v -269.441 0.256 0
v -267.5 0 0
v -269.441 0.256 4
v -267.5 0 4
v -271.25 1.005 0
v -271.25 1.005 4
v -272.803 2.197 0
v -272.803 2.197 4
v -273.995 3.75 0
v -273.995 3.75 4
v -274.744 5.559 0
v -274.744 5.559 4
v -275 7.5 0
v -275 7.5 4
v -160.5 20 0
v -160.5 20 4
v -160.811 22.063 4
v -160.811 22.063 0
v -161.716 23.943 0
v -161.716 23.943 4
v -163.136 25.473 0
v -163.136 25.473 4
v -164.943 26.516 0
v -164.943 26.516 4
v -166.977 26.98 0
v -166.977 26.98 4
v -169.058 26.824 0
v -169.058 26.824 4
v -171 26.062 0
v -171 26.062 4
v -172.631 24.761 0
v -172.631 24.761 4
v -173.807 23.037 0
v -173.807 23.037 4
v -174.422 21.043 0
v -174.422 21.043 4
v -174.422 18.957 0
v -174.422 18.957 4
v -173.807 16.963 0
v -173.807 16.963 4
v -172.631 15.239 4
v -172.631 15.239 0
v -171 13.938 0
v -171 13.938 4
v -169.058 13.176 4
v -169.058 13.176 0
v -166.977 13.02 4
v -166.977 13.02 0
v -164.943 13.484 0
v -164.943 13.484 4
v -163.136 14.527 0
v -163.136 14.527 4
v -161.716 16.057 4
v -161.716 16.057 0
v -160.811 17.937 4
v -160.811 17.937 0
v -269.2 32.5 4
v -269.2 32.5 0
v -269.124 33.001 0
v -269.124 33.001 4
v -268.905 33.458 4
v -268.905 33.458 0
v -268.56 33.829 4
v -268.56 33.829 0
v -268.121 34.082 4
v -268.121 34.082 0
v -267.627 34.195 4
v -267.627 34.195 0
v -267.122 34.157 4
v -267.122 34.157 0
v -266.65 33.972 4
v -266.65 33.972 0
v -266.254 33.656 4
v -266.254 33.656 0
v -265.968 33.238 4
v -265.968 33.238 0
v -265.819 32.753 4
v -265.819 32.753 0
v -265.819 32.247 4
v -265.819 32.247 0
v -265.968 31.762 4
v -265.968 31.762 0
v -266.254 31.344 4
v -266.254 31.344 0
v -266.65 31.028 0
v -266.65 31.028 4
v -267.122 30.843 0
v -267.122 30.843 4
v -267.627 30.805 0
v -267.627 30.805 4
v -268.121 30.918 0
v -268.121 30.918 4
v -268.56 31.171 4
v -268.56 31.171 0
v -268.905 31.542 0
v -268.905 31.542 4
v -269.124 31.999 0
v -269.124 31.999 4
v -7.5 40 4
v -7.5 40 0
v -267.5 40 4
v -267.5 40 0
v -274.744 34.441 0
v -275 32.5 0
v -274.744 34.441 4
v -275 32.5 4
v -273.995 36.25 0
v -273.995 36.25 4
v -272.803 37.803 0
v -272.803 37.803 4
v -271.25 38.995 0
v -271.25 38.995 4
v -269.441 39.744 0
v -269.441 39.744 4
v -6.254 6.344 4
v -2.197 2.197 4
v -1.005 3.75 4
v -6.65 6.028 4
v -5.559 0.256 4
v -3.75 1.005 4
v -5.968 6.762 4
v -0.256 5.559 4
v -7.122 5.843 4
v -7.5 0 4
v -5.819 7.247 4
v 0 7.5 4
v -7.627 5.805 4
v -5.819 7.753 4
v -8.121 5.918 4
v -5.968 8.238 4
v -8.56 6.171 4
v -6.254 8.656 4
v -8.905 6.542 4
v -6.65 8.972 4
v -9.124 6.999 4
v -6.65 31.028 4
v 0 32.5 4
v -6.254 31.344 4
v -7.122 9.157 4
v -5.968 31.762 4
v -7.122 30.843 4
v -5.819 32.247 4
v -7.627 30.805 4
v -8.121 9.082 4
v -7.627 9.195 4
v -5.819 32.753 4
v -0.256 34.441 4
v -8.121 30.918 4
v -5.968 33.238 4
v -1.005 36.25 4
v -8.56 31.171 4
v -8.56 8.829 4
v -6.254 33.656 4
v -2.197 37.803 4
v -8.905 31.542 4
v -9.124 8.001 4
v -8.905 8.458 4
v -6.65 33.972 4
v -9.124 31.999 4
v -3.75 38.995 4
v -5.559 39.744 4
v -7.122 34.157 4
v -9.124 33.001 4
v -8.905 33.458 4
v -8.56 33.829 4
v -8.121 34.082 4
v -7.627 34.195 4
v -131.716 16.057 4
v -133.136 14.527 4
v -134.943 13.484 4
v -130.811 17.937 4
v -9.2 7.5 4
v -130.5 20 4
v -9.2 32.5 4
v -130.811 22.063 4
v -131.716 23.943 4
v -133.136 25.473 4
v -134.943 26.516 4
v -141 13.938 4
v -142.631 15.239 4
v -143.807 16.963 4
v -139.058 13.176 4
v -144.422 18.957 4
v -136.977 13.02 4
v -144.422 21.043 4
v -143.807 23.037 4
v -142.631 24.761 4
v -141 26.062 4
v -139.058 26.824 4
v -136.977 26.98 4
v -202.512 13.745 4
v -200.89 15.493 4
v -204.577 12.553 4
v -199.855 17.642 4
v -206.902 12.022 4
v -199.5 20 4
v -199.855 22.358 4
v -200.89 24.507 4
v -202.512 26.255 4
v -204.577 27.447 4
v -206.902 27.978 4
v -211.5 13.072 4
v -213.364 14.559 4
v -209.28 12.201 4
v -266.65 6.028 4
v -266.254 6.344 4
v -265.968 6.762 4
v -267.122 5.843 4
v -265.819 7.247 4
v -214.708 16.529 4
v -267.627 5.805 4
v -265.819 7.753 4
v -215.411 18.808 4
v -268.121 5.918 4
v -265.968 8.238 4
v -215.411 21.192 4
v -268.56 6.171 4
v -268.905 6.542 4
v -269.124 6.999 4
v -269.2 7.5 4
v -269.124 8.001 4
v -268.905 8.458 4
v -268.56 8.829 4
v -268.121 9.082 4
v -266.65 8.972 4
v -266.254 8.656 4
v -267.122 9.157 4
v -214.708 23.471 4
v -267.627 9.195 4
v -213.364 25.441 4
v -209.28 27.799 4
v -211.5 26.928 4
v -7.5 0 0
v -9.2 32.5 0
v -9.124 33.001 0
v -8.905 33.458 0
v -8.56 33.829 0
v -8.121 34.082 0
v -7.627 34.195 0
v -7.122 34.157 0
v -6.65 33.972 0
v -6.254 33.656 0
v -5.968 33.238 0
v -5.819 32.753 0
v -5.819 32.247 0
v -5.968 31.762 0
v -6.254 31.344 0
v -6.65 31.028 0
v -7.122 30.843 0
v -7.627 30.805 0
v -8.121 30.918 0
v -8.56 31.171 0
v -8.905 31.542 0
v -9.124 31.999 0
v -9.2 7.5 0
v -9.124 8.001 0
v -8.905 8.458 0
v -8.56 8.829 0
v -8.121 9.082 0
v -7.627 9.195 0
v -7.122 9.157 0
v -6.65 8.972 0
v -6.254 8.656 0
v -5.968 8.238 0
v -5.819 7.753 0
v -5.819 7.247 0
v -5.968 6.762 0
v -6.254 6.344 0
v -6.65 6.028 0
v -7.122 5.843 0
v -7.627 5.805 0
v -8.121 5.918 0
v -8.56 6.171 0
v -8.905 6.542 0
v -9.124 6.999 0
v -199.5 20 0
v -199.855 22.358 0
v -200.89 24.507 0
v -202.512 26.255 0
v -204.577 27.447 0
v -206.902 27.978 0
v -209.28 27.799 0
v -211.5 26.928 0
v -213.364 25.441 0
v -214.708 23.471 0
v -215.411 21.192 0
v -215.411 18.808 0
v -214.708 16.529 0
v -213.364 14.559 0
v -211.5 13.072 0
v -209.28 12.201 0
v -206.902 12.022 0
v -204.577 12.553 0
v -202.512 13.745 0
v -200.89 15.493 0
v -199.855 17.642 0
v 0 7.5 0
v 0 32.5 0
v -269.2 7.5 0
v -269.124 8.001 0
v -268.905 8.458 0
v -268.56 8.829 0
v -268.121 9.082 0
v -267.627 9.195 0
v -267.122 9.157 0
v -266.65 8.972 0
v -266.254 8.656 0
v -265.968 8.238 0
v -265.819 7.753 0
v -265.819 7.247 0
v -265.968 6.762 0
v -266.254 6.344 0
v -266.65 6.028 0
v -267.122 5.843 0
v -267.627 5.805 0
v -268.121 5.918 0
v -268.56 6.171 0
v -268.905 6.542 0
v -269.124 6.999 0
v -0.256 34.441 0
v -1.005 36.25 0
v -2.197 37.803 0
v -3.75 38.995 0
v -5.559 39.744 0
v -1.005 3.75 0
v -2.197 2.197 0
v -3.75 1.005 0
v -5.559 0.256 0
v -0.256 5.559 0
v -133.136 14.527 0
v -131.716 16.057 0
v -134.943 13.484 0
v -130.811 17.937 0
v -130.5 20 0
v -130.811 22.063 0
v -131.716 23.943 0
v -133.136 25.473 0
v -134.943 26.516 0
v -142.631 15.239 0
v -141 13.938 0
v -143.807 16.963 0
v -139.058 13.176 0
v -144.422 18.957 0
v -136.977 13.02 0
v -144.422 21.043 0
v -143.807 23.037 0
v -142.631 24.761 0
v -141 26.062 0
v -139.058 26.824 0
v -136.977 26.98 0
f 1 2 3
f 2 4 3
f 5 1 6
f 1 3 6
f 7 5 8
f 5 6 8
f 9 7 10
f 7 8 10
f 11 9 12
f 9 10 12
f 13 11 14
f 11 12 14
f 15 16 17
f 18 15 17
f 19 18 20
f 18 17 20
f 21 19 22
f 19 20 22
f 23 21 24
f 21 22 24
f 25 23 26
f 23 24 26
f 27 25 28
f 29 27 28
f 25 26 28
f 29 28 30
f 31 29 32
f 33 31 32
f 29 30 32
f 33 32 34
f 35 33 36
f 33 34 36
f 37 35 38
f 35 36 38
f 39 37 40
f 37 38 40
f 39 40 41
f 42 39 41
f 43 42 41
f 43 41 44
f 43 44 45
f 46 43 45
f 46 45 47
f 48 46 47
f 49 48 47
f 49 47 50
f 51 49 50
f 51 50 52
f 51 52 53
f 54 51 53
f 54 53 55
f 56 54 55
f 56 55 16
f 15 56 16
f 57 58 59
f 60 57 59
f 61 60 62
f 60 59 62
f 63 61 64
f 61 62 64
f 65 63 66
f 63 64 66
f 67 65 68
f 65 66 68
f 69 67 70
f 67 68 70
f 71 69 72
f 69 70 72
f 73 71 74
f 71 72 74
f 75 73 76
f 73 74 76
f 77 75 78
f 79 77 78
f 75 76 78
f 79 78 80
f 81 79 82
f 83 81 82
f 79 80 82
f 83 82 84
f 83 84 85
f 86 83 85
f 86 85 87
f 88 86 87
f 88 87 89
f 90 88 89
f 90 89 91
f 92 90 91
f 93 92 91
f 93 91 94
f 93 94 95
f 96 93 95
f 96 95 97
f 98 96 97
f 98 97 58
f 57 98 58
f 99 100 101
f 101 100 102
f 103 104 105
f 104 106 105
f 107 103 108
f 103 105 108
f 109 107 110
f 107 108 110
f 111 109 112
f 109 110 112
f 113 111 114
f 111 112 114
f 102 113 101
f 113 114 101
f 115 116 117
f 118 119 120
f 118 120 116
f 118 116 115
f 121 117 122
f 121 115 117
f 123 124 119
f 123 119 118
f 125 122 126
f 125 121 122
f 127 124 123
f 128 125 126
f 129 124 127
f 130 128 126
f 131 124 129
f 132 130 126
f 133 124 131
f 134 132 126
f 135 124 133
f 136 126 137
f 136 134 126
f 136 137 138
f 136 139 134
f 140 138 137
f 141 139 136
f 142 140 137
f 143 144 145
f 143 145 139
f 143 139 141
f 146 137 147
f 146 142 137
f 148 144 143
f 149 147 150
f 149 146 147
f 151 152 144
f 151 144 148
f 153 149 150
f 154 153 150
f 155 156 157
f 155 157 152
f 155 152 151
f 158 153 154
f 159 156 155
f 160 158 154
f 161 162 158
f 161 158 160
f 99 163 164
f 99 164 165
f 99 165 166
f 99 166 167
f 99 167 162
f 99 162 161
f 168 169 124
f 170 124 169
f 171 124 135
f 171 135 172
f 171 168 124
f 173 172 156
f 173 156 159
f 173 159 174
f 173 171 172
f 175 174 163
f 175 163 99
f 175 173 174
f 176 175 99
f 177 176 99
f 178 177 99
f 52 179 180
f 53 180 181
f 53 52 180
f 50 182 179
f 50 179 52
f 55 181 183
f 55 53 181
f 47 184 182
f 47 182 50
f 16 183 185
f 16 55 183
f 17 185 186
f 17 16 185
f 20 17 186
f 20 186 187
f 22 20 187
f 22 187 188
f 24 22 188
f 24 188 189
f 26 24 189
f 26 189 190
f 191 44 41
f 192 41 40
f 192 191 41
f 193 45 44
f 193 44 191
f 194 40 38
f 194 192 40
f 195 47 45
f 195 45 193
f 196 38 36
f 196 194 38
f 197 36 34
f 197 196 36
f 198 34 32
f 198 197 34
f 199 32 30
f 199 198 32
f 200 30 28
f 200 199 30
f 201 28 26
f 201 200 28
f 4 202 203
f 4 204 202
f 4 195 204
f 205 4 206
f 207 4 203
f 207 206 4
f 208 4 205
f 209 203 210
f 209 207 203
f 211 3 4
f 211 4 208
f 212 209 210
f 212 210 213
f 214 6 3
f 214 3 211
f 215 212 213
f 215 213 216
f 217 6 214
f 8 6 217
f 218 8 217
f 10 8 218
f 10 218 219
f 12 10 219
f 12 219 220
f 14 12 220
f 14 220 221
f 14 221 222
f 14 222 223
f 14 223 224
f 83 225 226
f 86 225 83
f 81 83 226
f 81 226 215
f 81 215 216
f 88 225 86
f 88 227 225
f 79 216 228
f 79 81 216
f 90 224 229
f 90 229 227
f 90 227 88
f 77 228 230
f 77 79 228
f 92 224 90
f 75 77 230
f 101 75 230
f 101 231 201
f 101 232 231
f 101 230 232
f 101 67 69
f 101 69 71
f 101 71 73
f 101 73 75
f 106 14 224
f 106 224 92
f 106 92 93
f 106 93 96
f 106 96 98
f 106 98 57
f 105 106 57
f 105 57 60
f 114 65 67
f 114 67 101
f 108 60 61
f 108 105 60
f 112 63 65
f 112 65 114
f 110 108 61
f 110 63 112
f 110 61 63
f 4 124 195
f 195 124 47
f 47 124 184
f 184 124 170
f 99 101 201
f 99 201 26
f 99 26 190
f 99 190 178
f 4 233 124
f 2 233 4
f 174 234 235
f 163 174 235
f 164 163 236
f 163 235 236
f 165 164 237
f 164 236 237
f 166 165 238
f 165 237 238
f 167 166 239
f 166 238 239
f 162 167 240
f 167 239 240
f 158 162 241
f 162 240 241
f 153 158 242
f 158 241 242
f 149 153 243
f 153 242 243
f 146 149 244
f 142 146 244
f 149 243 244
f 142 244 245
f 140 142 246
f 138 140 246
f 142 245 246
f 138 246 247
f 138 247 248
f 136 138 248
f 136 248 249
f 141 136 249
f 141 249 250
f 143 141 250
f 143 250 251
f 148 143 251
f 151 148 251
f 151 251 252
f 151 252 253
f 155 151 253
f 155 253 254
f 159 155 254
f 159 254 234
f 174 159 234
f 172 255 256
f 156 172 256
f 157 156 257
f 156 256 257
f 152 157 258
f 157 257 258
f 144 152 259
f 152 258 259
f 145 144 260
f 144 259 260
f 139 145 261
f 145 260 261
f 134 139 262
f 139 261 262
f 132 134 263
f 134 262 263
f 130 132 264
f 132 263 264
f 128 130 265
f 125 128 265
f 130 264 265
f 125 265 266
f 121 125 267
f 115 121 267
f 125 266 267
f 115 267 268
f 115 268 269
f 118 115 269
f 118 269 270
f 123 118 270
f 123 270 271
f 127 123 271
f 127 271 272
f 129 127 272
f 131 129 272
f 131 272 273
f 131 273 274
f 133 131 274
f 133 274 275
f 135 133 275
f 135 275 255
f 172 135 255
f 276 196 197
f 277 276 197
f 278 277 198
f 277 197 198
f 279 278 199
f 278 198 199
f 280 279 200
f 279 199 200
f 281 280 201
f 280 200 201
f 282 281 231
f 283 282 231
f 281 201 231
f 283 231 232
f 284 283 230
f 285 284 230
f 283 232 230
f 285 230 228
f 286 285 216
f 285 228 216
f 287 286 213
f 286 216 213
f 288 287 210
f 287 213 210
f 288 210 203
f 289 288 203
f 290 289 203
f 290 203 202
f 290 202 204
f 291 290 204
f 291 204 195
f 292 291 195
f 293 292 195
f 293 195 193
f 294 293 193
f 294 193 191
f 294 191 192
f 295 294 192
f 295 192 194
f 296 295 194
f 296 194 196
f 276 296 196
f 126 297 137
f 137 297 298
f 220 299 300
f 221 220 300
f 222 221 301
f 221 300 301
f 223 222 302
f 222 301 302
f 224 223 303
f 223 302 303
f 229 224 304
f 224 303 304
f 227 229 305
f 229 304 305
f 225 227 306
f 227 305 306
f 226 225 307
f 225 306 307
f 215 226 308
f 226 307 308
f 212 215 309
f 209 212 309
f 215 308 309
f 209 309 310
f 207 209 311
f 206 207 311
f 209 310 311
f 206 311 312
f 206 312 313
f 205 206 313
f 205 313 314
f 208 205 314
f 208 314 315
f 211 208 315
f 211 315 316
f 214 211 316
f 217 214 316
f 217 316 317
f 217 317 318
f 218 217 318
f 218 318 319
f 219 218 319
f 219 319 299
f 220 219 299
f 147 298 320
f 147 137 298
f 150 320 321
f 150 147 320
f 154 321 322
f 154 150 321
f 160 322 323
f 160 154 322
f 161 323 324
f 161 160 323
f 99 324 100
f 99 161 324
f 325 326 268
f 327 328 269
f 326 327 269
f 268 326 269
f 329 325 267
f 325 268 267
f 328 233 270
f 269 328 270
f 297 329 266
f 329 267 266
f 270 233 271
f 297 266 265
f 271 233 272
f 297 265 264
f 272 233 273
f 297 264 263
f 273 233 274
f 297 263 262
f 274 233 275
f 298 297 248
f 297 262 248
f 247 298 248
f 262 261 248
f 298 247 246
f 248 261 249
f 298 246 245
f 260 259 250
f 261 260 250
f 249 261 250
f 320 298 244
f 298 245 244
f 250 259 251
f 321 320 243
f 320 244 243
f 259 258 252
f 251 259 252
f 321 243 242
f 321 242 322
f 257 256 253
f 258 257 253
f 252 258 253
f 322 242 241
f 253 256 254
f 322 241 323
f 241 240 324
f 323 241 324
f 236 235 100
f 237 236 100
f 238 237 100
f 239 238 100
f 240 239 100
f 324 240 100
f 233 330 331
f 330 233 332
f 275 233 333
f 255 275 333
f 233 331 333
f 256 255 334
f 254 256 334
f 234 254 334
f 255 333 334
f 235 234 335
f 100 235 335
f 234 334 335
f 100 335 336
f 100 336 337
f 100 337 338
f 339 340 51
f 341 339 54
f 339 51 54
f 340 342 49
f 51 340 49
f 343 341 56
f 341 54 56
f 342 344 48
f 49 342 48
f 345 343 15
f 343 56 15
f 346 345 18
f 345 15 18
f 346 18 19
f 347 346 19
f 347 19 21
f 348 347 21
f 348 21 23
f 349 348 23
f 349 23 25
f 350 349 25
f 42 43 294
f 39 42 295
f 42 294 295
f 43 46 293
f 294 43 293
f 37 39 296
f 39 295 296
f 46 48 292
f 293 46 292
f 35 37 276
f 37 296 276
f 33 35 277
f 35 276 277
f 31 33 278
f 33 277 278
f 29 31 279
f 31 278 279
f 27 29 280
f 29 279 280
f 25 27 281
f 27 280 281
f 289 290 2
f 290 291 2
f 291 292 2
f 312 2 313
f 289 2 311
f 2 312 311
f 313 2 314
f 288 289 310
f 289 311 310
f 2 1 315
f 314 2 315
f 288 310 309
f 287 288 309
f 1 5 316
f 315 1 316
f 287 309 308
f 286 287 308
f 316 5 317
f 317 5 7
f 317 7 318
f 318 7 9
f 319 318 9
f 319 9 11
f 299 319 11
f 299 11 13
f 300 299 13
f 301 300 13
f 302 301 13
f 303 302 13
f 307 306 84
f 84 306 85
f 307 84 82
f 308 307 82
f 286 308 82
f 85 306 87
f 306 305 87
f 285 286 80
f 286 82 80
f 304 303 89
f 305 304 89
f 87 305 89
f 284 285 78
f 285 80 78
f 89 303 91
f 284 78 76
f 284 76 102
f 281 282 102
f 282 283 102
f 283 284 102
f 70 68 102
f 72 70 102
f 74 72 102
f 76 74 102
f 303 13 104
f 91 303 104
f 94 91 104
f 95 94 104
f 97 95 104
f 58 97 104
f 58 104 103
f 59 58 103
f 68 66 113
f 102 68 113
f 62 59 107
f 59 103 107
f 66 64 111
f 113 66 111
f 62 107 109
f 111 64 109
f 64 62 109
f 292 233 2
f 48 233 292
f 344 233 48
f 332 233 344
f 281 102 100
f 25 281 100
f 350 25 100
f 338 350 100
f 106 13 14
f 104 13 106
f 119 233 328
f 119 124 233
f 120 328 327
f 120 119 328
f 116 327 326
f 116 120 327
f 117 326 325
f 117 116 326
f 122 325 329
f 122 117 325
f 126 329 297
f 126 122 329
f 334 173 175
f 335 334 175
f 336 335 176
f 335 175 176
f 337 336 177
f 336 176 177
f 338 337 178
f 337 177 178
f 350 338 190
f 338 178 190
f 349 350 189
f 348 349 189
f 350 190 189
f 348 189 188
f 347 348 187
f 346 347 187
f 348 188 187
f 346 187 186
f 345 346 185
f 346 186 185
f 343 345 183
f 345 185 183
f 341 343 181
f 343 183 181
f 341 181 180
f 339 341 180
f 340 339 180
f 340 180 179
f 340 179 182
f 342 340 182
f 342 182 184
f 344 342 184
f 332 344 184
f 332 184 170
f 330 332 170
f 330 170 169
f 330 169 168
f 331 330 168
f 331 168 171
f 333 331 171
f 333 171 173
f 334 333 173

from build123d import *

# Parameters (mm, degrees)
SKETCH_1_W          = 40
SKETCH_1_H          = 275
EXTRUDE_1_DEPTH     = 4
SKETCH_2_R          = 8
SKETCH_2_R_2        = 7
CUT_EXTRUDE_1_DEPTH = 5
HOLE_WIZARD_M3_1_D  = 3.4
FILLET_1_R          = 7.5


with BuildPart() as part:
    # ｽｹｯﾁ1 → ﾎﾞｽ - 押し出し1 (new body)
    with BuildSketch(Plane(origin=(0, 0, 0), x_dir=(0, 1, 0), z_dir=(0, 0, 1))):
        with Locations((20, 137.5)):
            Rectangle(SKETCH_1_W, SKETCH_1_H)
    extrude(amount=EXTRUDE_1_DEPTH)

    # ｽｹｯﾁ2 → ｶｯﾄ - 押し出し1 (cut, through all)
    with BuildSketch(Plane.XY.offset(4)):
        with Locations((-207.5, 20)):
            Circle(SKETCH_2_R)
        with Locations((-167.5, 20)):
            Circle(SKETCH_2_R_2)
        with Locations((-137.5, 20)):
            Circle(SKETCH_2_R_2)
    extrude(amount=-CUT_EXTRUDE_1_DEPTH, mode=Mode.SUBTRACT)

    # M3 すきま穴1 (through all)
    with Locations(Plane.XY.offset(4)):
        with Locations((-267.5, 32.5), (-267.5, 7.5), (-7.5, 7.5), (-7.5, 32.5)):
            Hole(HOLE_WIZARD_M3_1_D / 2)

    # ﾌｨﾚｯﾄ1
    fillet_1_edges = [part.edges().sort_by_distance(p)[0] for p in [
        (-275, 0, 2),
        (-275, 40, 2),
        (0, 40, 2),
        (0, 0, 2),
    ]]
    fillet(fillet_1_edges, radius=FILLET_1_R)


solid = part.part
